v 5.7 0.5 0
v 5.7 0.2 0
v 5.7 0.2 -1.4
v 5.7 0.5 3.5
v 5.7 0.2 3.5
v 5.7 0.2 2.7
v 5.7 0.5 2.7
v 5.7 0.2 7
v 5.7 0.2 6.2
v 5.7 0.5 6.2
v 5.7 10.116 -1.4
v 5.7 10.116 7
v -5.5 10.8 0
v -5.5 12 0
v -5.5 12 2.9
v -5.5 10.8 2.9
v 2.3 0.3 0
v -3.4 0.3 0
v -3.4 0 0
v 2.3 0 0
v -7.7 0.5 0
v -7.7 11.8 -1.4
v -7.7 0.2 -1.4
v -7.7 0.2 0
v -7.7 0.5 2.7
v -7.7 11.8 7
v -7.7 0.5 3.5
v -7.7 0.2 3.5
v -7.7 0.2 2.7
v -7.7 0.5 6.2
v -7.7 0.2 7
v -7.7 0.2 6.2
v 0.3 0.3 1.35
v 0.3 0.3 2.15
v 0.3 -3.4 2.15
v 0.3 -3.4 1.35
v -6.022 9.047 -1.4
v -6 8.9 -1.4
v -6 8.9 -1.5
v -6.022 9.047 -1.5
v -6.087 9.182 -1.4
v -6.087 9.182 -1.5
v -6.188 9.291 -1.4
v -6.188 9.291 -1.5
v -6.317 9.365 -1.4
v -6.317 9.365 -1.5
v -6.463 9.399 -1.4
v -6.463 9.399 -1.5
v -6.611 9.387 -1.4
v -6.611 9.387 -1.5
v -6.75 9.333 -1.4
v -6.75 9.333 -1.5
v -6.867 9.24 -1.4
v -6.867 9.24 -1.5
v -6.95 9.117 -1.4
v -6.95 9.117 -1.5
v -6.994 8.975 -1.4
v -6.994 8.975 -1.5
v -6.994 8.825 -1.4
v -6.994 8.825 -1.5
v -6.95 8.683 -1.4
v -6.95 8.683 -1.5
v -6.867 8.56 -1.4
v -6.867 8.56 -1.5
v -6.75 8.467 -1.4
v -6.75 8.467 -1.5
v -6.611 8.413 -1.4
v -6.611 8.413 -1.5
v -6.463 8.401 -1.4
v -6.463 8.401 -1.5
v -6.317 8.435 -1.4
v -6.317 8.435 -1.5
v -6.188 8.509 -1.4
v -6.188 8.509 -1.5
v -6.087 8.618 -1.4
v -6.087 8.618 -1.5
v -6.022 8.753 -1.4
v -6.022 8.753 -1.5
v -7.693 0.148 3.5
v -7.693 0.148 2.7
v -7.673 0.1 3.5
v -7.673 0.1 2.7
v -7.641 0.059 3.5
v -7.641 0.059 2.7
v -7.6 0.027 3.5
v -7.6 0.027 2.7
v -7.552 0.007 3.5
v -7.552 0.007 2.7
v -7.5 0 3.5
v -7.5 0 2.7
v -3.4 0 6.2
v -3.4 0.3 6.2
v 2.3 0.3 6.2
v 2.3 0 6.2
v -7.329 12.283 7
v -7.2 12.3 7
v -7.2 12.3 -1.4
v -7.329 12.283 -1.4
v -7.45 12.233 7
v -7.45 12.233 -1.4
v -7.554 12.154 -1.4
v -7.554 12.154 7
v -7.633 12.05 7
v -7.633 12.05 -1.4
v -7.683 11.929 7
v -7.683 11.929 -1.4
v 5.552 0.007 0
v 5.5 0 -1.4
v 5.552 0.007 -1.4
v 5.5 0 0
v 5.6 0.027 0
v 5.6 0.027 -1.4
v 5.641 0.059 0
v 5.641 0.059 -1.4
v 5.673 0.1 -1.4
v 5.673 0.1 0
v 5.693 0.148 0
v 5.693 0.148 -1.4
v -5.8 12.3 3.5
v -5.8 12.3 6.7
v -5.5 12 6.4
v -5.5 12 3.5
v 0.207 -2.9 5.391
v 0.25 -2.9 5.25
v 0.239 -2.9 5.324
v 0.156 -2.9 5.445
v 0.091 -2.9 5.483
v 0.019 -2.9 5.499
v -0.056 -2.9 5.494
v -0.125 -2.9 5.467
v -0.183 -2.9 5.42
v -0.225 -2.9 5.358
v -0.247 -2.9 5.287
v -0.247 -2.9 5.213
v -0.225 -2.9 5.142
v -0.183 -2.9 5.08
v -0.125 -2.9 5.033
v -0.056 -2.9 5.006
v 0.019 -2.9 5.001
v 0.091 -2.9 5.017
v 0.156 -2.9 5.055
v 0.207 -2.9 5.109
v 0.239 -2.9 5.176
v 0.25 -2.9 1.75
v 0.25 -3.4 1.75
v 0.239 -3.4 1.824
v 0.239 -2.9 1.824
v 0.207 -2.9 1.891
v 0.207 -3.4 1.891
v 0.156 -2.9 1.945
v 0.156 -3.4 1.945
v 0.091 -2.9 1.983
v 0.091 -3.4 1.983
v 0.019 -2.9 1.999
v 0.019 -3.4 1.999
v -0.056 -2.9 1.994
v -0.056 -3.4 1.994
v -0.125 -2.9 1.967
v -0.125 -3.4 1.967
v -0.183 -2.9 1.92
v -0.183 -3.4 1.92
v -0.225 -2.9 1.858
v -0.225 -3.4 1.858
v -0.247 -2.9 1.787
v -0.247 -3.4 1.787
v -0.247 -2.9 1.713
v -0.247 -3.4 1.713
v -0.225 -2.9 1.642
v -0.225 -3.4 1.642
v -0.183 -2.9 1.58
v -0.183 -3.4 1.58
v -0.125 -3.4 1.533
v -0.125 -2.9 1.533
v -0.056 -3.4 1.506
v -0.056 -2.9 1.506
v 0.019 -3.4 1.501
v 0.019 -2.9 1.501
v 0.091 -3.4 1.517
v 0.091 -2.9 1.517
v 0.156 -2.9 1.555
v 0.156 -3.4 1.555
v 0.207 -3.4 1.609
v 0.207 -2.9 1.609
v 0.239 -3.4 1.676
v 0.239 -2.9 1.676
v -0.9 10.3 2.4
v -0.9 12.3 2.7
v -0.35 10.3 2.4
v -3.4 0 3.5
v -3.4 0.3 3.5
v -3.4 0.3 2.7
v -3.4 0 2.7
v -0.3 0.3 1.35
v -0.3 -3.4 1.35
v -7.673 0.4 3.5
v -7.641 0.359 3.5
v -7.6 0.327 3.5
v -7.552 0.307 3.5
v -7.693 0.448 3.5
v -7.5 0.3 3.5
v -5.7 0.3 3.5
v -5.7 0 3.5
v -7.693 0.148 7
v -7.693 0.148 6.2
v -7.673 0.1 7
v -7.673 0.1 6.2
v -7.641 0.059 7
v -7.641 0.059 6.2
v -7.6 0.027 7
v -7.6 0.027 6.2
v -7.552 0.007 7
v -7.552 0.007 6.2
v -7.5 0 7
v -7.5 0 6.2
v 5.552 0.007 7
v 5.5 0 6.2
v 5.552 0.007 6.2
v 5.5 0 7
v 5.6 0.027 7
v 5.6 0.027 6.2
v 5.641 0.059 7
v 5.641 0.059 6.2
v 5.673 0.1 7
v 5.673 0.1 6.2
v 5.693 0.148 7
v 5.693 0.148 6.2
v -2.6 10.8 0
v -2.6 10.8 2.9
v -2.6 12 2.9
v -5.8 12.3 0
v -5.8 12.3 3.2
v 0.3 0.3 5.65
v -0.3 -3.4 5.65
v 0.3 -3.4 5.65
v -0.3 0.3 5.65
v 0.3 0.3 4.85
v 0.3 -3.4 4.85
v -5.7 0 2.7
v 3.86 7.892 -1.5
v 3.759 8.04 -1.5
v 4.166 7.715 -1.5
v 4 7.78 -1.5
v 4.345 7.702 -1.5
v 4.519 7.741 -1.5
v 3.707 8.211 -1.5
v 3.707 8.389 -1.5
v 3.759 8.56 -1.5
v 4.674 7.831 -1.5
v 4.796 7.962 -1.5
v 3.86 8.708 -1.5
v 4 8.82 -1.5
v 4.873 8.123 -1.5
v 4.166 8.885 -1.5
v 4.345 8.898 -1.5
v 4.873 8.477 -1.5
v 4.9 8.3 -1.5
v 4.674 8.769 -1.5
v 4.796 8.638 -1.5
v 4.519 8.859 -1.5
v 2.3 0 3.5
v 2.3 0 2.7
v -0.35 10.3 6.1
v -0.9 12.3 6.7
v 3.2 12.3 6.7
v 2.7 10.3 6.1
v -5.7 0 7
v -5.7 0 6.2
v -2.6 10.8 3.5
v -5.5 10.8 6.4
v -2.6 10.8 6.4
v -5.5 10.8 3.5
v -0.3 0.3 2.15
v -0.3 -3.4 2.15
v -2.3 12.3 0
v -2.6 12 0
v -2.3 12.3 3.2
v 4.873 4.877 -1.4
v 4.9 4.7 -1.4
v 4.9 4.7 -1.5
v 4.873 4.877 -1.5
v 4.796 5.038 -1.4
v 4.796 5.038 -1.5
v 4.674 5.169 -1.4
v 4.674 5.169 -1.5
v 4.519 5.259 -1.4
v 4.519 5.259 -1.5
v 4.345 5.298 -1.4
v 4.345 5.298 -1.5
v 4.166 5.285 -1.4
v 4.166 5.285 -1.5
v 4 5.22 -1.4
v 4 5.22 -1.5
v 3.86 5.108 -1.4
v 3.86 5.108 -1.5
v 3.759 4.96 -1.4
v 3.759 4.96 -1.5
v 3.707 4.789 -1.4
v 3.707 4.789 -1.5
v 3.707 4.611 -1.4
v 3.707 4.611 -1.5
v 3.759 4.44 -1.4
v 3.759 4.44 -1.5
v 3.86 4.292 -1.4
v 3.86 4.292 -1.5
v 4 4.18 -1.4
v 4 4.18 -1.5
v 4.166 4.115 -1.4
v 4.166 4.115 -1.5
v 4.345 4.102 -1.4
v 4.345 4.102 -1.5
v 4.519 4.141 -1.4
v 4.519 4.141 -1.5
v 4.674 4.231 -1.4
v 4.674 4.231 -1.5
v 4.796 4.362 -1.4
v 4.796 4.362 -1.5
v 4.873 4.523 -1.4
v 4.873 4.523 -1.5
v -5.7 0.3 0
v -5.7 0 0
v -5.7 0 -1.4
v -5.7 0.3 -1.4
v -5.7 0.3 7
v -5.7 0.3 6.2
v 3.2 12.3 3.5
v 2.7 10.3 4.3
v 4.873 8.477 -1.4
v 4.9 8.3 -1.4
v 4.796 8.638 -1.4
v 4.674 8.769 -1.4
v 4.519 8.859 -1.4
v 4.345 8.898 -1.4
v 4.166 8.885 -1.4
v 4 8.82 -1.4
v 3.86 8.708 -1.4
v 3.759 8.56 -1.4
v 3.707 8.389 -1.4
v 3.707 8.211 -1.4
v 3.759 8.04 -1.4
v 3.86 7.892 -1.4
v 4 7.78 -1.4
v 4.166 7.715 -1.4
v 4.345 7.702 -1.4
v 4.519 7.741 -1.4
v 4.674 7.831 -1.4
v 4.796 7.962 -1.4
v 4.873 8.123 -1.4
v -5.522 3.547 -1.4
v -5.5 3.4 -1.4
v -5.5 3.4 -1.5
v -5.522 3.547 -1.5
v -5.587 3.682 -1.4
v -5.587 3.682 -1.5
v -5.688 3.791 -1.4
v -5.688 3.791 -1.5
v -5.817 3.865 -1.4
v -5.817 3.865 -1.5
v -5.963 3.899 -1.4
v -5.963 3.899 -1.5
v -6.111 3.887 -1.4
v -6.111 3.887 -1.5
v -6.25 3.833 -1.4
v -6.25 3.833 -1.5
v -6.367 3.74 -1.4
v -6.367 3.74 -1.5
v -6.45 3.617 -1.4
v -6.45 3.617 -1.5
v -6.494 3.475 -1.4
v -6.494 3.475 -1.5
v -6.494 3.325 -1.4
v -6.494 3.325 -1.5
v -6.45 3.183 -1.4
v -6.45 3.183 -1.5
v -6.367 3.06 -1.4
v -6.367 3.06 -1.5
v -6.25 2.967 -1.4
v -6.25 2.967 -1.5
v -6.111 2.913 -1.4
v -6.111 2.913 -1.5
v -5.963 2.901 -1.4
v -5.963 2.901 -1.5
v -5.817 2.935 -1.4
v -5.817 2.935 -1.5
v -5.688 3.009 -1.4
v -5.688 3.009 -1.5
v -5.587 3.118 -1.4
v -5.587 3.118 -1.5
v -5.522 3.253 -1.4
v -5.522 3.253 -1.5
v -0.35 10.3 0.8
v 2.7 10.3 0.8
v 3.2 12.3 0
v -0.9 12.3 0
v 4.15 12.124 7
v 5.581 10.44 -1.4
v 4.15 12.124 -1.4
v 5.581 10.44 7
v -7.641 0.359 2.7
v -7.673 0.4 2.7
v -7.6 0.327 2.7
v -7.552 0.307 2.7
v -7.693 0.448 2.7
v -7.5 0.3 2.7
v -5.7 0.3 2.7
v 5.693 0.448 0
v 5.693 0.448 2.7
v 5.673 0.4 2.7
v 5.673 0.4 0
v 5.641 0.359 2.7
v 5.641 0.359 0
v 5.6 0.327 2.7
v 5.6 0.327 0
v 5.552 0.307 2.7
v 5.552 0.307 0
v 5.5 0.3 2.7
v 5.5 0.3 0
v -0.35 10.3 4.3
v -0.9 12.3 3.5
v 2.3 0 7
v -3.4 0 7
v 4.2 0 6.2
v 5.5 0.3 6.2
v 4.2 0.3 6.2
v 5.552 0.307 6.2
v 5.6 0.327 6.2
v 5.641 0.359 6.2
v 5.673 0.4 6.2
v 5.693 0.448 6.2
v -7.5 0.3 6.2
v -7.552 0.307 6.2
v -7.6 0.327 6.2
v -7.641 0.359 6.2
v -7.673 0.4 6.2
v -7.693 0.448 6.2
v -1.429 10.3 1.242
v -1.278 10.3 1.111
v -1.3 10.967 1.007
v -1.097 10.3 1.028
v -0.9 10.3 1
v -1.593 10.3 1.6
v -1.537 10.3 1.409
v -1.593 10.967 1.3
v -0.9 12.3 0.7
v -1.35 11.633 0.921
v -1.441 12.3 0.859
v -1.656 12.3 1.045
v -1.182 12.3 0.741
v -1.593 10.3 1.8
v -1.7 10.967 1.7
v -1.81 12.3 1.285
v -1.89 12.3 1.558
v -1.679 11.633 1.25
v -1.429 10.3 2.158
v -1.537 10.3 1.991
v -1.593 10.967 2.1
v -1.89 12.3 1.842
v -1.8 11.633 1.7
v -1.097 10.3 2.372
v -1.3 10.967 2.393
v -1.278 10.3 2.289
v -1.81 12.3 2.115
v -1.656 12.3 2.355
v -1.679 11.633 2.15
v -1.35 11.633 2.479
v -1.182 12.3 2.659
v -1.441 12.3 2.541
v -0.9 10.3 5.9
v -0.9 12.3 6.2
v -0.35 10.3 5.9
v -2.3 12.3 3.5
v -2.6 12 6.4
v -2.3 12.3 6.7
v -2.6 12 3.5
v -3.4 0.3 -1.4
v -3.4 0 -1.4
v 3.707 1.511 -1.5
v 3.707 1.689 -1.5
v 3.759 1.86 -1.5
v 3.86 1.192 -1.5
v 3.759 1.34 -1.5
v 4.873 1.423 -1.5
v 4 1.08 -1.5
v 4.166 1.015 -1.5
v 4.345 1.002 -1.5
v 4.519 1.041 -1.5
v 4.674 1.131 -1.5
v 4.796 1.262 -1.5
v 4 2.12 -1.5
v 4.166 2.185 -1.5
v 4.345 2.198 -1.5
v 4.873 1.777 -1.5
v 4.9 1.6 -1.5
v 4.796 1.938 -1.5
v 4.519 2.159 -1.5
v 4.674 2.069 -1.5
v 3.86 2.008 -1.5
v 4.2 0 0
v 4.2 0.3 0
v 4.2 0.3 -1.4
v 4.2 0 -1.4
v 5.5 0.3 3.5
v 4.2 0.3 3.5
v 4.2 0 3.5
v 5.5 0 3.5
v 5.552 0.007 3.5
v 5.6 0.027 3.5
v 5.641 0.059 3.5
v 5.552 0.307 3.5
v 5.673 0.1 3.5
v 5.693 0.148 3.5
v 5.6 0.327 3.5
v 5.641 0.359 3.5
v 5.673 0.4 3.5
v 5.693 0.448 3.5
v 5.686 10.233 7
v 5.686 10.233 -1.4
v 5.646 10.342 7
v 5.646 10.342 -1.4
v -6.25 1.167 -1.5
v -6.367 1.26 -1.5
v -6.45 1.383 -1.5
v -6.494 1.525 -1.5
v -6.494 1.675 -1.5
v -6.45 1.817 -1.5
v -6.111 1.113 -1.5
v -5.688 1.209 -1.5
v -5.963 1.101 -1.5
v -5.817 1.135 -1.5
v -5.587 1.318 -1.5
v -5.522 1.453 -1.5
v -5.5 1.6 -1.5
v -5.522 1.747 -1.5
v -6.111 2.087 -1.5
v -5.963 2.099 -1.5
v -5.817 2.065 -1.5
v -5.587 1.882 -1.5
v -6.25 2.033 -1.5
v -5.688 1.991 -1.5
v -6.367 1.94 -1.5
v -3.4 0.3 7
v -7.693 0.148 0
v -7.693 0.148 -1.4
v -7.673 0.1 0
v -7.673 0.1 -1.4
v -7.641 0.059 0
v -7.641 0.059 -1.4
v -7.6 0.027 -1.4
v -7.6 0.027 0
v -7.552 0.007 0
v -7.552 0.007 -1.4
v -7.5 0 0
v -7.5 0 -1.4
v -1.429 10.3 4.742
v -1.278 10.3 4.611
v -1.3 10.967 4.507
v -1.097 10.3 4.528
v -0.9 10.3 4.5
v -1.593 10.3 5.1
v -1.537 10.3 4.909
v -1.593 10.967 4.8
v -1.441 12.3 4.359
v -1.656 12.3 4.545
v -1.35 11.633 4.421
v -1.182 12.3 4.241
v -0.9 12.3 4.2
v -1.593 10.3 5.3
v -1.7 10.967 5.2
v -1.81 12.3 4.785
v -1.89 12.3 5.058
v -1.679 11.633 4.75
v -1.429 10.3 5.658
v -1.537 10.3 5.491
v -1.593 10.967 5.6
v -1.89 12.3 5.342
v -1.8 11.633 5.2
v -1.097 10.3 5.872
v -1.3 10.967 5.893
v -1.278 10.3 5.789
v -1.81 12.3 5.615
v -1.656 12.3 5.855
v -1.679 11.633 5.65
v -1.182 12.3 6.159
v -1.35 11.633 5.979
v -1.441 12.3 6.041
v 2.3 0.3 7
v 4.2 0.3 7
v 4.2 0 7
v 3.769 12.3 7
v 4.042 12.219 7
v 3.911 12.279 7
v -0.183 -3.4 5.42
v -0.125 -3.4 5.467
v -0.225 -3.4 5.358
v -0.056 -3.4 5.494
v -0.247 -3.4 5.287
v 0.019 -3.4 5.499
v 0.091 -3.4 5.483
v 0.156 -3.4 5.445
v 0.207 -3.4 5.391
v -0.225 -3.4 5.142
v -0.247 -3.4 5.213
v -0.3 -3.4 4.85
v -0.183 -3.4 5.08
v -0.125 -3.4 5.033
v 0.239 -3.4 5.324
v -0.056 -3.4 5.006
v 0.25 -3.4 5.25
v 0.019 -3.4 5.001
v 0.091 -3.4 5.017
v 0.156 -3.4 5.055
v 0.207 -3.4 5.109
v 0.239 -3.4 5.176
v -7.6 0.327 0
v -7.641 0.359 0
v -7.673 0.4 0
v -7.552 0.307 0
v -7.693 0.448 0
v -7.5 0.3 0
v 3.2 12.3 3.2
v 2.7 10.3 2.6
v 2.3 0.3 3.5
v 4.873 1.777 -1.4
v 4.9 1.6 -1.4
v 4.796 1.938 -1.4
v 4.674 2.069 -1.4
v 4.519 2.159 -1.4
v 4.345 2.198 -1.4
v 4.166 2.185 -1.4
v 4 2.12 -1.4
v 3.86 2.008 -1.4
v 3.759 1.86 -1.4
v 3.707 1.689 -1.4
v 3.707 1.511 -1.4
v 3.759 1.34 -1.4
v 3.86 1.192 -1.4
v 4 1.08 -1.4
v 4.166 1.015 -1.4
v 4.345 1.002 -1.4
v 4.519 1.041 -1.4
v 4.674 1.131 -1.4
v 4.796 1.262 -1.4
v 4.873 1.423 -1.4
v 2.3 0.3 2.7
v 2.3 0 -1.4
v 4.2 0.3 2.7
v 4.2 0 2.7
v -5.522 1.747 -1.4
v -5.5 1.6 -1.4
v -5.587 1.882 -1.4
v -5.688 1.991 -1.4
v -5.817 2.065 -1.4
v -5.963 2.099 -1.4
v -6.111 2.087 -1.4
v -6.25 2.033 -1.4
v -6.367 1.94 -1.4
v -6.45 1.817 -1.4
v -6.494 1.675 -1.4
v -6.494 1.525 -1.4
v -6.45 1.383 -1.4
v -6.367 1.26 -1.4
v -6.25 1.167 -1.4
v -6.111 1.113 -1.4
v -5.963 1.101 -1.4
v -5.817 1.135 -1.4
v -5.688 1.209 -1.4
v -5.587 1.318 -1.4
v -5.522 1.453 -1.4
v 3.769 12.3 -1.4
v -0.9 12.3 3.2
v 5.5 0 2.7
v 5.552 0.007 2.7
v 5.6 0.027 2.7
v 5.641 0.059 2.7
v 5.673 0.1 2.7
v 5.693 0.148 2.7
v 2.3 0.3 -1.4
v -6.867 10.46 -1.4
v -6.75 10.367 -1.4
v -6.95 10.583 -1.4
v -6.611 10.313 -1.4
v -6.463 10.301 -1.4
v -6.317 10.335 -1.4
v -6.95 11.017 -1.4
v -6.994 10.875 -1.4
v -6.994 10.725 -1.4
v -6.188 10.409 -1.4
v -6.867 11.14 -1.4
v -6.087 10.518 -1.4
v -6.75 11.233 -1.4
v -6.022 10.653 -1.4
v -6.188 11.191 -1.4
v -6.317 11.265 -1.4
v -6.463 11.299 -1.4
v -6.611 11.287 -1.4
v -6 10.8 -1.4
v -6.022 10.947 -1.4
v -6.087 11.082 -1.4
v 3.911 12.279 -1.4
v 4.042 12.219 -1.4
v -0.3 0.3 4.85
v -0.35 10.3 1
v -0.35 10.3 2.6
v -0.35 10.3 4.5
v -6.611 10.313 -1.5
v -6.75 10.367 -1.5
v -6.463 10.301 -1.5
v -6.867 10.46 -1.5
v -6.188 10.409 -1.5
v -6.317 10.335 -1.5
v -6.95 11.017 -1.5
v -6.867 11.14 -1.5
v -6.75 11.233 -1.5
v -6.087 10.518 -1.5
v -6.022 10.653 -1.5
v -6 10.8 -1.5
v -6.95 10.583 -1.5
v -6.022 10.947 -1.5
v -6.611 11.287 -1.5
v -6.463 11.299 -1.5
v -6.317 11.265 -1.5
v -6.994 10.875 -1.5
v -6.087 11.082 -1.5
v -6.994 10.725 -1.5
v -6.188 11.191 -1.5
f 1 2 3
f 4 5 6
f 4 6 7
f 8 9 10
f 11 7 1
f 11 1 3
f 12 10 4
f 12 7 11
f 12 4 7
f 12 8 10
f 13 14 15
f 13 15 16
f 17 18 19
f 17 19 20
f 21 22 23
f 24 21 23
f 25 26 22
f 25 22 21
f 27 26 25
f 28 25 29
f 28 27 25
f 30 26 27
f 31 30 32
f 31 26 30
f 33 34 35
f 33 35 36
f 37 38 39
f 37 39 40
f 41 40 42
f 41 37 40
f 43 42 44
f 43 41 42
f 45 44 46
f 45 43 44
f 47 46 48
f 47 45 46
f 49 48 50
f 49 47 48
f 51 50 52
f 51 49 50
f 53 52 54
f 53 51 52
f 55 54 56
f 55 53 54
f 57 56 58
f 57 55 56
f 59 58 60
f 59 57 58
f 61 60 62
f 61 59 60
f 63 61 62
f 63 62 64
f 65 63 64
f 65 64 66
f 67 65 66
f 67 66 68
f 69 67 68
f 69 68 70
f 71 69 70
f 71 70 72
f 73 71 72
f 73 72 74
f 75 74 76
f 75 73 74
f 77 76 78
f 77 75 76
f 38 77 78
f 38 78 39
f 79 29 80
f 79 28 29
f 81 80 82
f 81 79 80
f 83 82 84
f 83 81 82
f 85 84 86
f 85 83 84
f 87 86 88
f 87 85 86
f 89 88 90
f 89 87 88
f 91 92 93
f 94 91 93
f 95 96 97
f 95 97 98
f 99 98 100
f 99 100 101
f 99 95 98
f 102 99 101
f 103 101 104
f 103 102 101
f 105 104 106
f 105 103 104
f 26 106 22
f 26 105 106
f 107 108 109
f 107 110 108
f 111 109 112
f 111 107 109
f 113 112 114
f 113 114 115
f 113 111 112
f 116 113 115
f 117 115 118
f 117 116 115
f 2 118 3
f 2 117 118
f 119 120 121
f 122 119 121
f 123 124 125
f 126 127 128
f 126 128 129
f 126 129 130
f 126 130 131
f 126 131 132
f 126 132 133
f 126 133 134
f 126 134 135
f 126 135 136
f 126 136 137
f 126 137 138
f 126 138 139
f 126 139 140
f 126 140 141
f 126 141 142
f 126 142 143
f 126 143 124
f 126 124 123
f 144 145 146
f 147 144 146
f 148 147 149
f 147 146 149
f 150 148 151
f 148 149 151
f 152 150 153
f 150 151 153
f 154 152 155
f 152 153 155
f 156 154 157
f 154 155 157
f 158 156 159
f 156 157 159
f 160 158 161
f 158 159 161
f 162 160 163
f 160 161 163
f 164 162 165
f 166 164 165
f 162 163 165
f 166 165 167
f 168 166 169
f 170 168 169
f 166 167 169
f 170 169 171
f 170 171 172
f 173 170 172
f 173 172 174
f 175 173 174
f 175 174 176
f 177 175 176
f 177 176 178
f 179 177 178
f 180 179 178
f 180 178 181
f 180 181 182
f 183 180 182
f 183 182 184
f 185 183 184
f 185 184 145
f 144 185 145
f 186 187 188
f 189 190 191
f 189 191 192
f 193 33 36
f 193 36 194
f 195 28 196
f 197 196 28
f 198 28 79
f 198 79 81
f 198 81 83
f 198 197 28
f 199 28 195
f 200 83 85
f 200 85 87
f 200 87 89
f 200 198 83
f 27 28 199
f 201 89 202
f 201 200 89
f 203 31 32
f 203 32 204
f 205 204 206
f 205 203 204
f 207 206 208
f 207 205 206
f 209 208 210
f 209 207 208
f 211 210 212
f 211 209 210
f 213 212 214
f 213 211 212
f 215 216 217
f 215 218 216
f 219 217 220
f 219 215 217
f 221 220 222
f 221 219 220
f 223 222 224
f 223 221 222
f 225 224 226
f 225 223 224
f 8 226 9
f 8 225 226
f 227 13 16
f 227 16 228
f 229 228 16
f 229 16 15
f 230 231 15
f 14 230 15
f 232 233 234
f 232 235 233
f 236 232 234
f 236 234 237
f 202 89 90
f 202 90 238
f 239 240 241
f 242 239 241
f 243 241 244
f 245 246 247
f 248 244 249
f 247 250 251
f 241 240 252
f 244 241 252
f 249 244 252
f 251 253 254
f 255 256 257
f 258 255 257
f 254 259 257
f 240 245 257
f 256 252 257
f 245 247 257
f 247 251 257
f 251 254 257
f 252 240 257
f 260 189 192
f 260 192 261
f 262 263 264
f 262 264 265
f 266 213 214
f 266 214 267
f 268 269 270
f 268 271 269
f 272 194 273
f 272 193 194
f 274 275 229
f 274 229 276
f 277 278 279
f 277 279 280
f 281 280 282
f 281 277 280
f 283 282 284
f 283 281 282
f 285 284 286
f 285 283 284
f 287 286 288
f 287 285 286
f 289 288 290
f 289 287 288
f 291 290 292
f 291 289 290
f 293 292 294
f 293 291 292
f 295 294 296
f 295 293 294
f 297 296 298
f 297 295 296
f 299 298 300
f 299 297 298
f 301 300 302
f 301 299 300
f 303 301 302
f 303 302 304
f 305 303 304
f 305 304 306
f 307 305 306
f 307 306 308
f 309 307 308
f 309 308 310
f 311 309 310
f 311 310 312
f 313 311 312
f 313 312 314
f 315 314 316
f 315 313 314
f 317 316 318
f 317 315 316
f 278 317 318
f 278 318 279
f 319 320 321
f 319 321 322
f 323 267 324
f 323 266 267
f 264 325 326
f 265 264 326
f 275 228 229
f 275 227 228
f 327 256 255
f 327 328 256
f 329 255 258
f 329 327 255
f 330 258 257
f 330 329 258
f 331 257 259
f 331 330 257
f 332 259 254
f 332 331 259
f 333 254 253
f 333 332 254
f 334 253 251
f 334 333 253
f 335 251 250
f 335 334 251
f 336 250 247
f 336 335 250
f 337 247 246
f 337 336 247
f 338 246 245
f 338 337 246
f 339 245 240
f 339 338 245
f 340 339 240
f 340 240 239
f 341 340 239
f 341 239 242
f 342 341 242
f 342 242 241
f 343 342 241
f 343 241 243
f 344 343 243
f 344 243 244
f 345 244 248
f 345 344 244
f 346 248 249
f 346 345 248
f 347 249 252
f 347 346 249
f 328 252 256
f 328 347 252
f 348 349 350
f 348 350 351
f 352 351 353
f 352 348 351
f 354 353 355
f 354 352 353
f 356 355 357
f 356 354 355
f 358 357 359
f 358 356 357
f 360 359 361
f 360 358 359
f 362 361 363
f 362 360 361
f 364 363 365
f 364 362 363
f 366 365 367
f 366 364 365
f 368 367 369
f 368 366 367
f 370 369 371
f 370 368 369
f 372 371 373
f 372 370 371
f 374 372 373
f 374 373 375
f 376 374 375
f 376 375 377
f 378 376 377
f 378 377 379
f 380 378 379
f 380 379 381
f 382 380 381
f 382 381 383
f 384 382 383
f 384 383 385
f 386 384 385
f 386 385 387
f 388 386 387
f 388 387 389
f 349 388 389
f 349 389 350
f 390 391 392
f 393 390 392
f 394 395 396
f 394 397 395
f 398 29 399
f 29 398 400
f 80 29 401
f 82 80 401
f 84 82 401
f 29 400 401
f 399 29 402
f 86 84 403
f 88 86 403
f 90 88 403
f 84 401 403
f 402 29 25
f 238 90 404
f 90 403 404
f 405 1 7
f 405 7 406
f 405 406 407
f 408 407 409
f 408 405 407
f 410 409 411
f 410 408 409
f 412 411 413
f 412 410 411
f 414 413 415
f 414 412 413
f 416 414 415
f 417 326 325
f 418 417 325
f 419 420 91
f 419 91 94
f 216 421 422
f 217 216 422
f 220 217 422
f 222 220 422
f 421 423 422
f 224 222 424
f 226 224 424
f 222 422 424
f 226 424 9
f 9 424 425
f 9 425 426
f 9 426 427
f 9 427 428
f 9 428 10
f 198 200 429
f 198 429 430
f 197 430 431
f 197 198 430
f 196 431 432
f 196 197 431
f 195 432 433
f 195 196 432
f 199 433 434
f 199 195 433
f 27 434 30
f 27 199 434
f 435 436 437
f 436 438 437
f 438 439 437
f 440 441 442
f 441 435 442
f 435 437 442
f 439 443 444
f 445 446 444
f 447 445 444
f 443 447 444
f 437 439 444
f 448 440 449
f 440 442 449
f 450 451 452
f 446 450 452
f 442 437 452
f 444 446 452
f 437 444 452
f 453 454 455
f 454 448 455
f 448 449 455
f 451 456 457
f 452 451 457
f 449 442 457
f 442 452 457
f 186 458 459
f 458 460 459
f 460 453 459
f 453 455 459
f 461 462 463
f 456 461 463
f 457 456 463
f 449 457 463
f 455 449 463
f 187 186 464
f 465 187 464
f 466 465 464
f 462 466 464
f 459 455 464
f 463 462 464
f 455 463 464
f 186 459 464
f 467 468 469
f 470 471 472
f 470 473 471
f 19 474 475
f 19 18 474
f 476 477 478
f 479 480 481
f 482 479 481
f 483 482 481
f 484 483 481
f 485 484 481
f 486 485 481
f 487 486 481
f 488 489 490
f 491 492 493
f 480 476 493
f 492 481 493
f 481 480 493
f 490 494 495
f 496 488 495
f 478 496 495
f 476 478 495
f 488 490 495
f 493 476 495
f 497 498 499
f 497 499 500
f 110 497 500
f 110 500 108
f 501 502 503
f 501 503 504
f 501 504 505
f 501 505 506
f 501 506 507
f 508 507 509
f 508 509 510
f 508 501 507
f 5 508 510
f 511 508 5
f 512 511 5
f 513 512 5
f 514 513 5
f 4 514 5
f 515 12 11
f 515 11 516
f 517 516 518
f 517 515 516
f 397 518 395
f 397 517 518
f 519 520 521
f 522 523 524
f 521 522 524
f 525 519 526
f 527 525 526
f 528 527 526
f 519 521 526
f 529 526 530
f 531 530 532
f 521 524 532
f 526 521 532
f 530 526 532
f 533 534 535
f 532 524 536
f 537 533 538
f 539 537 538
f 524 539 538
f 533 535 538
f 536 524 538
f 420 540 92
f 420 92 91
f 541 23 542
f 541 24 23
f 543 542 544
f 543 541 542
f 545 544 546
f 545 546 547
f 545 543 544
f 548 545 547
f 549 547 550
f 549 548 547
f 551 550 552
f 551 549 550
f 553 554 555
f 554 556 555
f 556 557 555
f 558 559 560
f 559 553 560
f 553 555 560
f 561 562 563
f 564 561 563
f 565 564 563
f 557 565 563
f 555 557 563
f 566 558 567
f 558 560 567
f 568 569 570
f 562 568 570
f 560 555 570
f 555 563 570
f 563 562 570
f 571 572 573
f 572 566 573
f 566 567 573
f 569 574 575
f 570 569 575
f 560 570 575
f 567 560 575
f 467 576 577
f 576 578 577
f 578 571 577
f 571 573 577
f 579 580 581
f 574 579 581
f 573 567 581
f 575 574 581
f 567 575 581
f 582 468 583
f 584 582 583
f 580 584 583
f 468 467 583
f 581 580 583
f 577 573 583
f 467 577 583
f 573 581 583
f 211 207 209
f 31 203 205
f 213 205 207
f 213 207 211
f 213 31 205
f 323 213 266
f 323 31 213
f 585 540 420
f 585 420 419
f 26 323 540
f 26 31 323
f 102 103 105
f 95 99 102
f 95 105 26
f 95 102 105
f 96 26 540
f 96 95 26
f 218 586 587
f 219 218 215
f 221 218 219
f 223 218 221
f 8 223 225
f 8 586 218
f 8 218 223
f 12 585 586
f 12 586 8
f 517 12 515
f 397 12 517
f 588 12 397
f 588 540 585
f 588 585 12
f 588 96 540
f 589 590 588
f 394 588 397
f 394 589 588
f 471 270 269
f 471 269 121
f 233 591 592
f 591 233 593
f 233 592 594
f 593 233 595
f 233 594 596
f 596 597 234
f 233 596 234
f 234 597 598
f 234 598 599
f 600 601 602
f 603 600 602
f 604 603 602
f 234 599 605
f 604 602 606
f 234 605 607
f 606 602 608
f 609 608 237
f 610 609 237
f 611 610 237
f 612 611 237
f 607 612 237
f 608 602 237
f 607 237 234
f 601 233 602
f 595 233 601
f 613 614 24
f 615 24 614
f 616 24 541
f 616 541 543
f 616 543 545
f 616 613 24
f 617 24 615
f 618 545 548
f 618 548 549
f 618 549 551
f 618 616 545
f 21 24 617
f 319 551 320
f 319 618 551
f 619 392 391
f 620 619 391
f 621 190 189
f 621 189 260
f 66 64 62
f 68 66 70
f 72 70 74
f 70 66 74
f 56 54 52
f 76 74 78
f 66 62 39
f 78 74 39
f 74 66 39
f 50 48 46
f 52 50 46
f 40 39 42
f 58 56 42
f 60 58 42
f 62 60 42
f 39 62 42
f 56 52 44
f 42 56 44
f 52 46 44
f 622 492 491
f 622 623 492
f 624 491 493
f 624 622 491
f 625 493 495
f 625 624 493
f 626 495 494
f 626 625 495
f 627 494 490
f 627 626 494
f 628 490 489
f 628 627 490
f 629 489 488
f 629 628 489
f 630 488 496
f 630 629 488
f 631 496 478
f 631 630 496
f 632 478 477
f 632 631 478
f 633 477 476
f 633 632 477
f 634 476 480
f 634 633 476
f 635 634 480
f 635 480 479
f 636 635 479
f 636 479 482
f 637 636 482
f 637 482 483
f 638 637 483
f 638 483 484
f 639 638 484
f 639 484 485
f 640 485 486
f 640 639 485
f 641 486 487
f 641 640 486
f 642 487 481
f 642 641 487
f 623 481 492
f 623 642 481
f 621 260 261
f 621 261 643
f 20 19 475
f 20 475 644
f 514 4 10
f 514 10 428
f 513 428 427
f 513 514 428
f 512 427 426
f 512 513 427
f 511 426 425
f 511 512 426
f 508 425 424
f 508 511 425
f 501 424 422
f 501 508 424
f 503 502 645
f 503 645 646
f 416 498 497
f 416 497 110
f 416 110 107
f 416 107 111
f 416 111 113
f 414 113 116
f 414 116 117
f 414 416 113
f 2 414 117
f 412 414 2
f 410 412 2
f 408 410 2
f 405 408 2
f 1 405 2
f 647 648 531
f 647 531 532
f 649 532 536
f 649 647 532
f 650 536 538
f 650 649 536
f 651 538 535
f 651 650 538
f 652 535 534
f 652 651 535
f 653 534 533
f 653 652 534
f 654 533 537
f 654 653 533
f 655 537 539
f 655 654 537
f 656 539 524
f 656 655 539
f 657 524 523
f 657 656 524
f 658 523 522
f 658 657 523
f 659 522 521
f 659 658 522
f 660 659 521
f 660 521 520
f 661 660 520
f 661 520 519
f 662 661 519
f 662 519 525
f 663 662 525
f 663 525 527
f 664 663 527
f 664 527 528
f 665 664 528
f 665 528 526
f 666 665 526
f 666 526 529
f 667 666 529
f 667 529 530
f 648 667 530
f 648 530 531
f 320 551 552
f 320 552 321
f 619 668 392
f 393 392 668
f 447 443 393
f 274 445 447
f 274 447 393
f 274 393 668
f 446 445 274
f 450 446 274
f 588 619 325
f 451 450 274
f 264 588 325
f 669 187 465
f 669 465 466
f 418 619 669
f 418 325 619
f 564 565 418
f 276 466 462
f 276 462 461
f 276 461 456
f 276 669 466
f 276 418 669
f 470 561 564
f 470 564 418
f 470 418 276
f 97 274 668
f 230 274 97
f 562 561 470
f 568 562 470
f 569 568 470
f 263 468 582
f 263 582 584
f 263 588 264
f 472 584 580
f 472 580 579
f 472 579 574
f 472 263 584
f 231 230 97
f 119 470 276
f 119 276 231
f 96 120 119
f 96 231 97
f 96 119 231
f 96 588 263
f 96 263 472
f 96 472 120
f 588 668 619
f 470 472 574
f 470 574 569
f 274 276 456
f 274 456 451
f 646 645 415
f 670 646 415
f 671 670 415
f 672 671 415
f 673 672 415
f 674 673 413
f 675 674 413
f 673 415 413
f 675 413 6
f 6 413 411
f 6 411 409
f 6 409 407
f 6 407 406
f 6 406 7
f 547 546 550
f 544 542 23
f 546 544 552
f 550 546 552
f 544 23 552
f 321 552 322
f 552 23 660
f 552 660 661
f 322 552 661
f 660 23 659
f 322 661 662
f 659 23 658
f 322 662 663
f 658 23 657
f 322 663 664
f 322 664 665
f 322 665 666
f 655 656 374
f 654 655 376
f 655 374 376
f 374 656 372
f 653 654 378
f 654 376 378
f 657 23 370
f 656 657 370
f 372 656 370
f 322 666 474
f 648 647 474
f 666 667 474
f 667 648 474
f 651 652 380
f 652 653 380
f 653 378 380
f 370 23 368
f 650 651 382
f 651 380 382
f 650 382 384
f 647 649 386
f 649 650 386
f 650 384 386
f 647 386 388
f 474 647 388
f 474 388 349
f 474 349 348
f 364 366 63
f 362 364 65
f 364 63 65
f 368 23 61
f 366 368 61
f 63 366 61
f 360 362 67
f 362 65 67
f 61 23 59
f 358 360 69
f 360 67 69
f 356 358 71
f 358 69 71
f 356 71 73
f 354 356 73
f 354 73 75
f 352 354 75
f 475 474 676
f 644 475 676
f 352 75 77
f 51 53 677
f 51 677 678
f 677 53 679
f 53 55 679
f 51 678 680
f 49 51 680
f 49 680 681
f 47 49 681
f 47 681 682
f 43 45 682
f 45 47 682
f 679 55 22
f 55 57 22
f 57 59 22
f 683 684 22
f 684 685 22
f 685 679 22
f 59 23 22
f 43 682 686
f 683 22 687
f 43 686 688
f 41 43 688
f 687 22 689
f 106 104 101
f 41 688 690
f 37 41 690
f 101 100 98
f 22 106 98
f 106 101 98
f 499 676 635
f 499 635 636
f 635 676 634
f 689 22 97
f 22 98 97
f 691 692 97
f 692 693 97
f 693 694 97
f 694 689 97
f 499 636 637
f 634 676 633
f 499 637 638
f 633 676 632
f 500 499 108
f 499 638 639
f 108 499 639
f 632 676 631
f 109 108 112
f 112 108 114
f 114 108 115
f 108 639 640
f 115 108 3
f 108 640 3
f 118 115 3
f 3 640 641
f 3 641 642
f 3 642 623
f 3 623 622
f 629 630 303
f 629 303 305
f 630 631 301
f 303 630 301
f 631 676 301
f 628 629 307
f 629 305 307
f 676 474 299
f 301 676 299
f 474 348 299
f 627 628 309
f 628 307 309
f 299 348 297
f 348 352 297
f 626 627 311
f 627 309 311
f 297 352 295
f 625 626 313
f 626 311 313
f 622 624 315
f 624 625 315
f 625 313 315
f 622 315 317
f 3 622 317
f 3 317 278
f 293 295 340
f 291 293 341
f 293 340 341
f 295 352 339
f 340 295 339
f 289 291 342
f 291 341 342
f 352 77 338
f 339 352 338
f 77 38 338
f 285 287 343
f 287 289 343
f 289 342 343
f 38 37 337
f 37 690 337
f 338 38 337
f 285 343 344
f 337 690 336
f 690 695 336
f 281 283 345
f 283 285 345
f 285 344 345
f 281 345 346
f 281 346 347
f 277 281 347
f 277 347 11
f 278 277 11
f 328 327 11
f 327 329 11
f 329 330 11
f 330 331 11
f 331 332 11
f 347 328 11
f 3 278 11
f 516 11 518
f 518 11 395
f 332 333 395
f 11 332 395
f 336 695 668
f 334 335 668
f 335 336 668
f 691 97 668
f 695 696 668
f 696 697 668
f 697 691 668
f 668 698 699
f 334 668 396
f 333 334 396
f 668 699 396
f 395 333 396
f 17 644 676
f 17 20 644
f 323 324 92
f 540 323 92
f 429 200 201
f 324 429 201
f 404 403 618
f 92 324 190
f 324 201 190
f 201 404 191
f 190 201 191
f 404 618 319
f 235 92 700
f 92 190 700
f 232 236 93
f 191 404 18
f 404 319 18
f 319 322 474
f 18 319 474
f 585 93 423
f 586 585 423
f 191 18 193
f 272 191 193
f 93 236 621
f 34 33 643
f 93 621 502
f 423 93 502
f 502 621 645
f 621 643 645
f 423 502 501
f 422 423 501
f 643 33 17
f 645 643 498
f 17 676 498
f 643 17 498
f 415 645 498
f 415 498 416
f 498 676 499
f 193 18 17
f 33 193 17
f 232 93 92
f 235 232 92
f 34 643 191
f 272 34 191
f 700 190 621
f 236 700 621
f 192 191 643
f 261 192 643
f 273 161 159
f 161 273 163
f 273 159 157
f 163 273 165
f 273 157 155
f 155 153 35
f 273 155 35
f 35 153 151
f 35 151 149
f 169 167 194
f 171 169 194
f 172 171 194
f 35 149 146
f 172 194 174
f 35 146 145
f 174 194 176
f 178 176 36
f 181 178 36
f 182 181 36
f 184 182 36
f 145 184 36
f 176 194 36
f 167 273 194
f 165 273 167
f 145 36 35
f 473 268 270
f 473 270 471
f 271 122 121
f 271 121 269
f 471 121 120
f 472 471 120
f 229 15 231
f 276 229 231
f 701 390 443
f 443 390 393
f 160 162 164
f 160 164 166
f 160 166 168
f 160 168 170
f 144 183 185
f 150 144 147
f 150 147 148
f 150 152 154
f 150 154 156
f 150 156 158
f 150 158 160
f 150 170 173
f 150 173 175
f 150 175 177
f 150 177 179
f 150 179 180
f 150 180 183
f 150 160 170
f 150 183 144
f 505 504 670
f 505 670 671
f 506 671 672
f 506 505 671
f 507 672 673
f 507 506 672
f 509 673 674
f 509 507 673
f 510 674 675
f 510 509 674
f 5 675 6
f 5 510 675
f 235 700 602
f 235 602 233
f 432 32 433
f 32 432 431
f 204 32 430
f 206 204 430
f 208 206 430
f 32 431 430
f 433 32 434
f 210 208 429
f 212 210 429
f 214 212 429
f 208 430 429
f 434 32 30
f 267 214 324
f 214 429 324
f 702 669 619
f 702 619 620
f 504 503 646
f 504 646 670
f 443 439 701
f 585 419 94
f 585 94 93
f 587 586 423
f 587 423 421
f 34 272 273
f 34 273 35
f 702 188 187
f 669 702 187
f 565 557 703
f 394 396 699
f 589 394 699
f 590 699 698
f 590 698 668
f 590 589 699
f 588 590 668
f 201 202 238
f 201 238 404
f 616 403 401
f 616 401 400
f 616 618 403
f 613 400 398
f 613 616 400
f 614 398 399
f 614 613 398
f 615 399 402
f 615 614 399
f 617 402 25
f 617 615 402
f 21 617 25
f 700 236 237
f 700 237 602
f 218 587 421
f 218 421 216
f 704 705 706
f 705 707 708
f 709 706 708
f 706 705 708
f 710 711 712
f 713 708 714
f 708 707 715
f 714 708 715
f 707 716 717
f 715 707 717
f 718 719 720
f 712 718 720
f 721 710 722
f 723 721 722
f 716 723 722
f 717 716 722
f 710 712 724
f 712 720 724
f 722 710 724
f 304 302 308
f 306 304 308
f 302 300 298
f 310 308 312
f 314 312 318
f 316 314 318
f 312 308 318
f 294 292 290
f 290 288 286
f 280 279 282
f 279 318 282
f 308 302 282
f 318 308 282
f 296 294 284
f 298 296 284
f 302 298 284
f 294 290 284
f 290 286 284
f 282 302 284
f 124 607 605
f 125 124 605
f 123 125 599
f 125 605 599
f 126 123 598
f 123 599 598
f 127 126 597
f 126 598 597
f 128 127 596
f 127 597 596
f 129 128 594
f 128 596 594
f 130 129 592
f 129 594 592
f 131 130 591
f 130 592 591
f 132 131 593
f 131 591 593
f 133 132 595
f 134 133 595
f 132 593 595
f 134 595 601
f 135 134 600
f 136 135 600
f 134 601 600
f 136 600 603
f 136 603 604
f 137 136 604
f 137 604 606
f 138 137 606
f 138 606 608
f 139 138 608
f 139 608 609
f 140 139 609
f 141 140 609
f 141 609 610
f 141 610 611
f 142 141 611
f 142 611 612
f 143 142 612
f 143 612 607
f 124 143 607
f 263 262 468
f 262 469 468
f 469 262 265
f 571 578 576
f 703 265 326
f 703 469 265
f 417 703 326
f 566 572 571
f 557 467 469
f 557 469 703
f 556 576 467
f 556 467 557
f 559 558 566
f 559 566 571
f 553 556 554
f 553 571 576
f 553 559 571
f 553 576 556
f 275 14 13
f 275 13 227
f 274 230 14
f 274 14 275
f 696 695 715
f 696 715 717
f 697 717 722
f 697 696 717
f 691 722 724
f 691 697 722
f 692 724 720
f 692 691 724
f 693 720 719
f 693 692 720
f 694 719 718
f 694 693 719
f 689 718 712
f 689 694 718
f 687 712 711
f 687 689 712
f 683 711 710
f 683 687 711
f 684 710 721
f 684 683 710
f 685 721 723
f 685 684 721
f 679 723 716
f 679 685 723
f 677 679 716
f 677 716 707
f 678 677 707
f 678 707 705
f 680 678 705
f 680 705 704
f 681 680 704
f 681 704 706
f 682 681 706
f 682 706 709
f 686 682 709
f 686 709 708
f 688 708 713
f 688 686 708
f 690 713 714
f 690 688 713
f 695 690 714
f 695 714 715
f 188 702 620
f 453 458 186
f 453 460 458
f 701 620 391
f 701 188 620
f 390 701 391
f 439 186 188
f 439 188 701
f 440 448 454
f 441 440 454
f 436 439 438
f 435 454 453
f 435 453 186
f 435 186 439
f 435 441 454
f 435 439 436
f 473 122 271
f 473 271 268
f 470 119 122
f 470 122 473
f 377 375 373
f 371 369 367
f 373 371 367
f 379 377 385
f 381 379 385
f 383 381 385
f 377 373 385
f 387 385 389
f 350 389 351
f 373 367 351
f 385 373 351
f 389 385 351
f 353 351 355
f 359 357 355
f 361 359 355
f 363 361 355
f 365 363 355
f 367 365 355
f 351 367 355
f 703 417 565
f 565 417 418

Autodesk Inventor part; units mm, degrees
ref_plane "YZ Plane" through (0, 0, 0) normal (1, 0, 0) x (0, 1, 0)
ref_plane "XZ Plane" through (0, 0, 0) normal (0, 1, 0) x (-1, 0, 0)
ref_plane "XY Plane" through (0, 0, 0) normal (0, 0, 1) x (1, 0, 0)
sketch "Skizze_1" plane through (0, 0, 0) normal (0, 0, 1) x (1, 0, 0)
  arc A0 (-7.7, 0.5) -> (-7.5, 0.3) centre (-7.5, 0.5) ccw
  line L0 (-7.5, 0.3) -> (5.5, 0.3)
  arc A1 (5.5, 0.3) -> (5.7, 0.5) centre (5.5, 0.5) ccw
  line L1 (5.7, 0.5) -> (5.7, 10.1162)
  arc A2 (5.7, 10.1162) -> (5.581, 10.44) centre (5.2, 10.1162) ccw
  line L2 (5.581, 10.44) -> (4.1497, 12.1238)
  arc A3 (4.1497, 12.1238) -> (3.7688, 12.3) centre (3.7688, 11.8) ccw
  line L3 (3.7688, 12.3) -> (-7.2, 12.3)
  arc A4 (-7.2, 12.3) -> (-7.7, 11.8) centre (-7.2, 11.8) ccw
  line L4 (-7.7, 11.8) -> (-7.7, 0.5)
extrude "Extrusion1" add sketch "Skizze_1" along normal blind 7
sketch "Skizze_2" plane through (0, 0, 7) normal (0, 0, 1) x (1, 0, 0)
  line L0 (4.2, 0) -> (5.5, 0)
  arc A0 (5.5, 0) -> (5.7, 0.2) centre (5.5, 0.2) ccw
  line L1 (5.7, 0.2) -> (5.7, 0.5)
  line L2 (5.7, 0.5) -> (4.2, 0.5)
  line L3 (4.2, 0.5) -> (4.2, 0)
extrude "Extrusion2" add sketch "Skizze_2" against normal blind 0.8
pattern_linear "Rectangular Pattern1" count 2 spacing 3.5 along (0, 0, -1) of "Extrusion2"
sketch "Skizze_4" plane through (0, 0, 7) normal (0, 0, 1) x (1, 0, 0)
  line L0 (-7.7, 1) -> (-7.7, 0.2)
  arc A0 (-7.7, 0.2) -> (-7.5, 0) centre (-7.5, 0.2) ccw
  line L1 (-7.5, 0) -> (-5.7, 0)
  line L2 (-5.7, 0) -> (-5.7, 1)
  line L3 (-5.7, 1) -> (-7.7, 1)
extrude "Extrusion3" add sketch "Skizze_4" against normal blind 0.8
pattern_linear "Rectangular Pattern2" count 2 spacing 3.5 along (0, 0, -1) of "Extrusion3"
sketch "Skizze_6" plane through (0, 0, 7) normal (0, 0, 1) x (1, 0, 0)
  line L0 (-3.4, 0) -> (2.3, 0)
  line L1 (2.3, 0) -> (2.3, 1)
  line L2 (2.3, 1) -> (-3.4, 1)
  line L3 (-3.4, 1) -> (-3.4, 0)
extrude "Extrusion4" add sketch "Skizze_6" against normal blind 0.8
pattern_linear "Rectangular Pattern3" count 2 spacing 3.5 along (0, 0, -1) of "Extrusion4"
sketch "Skizze_8" plane through (0, 0, 0) normal (0, 0, 1) x (1, 0, 0)
  circle A0 centre (4.3, 1.6) radius 0.6
extrude "Extrusion5" add sketch "Skizze_8" against normal blind 1.5
sketch "Skizze_9" plane through (0, 0, 0) normal (0, 0, 1) x (1, 0, 0)
  circle A0 centre (4.3, 4.7) radius 0.6
extrude "Extrusion6" add sketch "Skizze_9" against normal blind 1.5
sketch "Skizze_10" plane through (0, 0, 0) normal (0, 0, 1) x (1, 0, 0)
  circle A0 centre (4.3, 8.3) radius 0.6
extrude "Extrusion7" add sketch "Skizze_10" against normal blind 1.5
sketch "Skizze_11" plane through (0, 0, 0) normal (0, 0, 1) x (1, 0, 0)
  circle A0 centre (-6, 1.6) radius 0.5
extrude "Extrusion8" add sketch "Skizze_11" against normal blind 1.5
sketch "Skizze_12" plane through (0, 0, 0) normal (0, 0, 1) x (1, 0, 0)
  circle A0 centre (-6, 3.4) radius 0.5
extrude "Extrusion9" add sketch "Skizze_12" against normal blind 1.5
sketch "Skizze_13" plane through (0, 0, 0) normal (0, 0, 1) x (1, 0, 0)
  circle A0 centre (-6.5, 8.9) radius 0.5
extrude "Extrusion10" add sketch "Skizze_13" against normal blind 1.5
sketch "Skizze_14" plane through (0, 0, 0) normal (0, 0, 1) x (1, 0, 0)
  circle A0 centre (-6.5, 10.8) radius 0.5
extrude "Extrusion11" add sketch "Skizze_14" against normal blind 1.5
sketch "Skizze_15" plane through (0, 0, 0) normal (0, 0, 1) x (1, 0, 0)
  arc A0 (-7.7, 0.2) -> (-7.5, 0) centre (-7.5, 0.2) ccw
  line L0 (-7.5, 0) -> (-5.7, 0)
  line L1 (-5.7, 0) -> (-5.7, 0.3)
  line L2 (-5.7, 0.3) -> (-3.4, 0.3)
  line L3 (-3.4, 0.3) -> (-3.4, 0)
  line L4 (-3.4, 0) -> (2.3, 0)
  line L5 (2.3, 0) -> (2.3, 0.3)
  line L6 (2.3, 0.3) -> (4.2, 0.3)
  line L7 (4.2, 0.3) -> (4.2, 0)
  line L8 (4.2, 0) -> (5.5, 0)
  arc A1 (5.5, 0) -> (5.7, 0.2) centre (5.5, 0.2) ccw
  line L9 (5.7, 0.2) -> (5.7, 10.1162)
  arc A2 (5.7, 10.1162) -> (5.581, 10.44) centre (5.2, 10.1162) ccw
  line L10 (5.581, 10.44) -> (4.1497, 12.1238)
  arc A3 (4.1497, 12.1238) -> (3.7688, 12.3) centre (3.7688, 11.8) ccw
  line L11 (3.7688, 12.3) -> (-7.2, 12.3)
  arc A4 (-7.2, 12.3) -> (-7.7, 11.8) centre (-7.2, 11.8) ccw
  line L12 (-7.7, 11.8) -> (-7.7, 0.2)
extrude "Extrusion12" add sketch "Skizze_15" against normal blind 1.4
sketch "Skizze_16" plane through (0, 0, 0) normal (0, 0, 1) x (1, 0, 0)
  line L0 (-5.8, 12.3) -> (-5.5, 12)
  line L1 (-5.5, 12) -> (-5.5, 10.8)
  line L2 (-5.5, 10.8) -> (-2.6, 10.8)
  line L3 (-2.6, 10.8) -> (-2.6, 12)
  line L4 (-2.6, 12) -> (-2.3, 12.3)
  line L5 (-2.3, 12.3) -> (-5.8, 12.3)
extrude "Extrusion13" cut sketch "Skizze_16" along normal blind 3.2
pattern_linear "Rectangular Pattern4" count 2 spacing 3.5 along (0, 0, 1) of "Extrusion13"
sketch "Skizze_18" plane through (0, 0, 0) normal (1, 0, 0) x (0, 1, 0)
  line L0 (10.8, 3.2) -> (10.8, 2.9)
  line L1 (10.8, 2.9) -> (12, 2.9)
  line L2 (12, 2.9) -> (12.3, 3.2)
  line L3 (12.3, 3.2) -> (10.8, 3.2)
extrude "Extrusion14" add sketch "Skizze_18" against normal blind 6
pattern_linear "Rectangular Pattern5" count 2 spacing 3.5 along (0, 0, 1) of "Extrusion14"
sketch "Skizze_20" plane through (-0.9, 0, 0) normal (1, 0, 0) x (0, 0, -1)
  line L0 (-3.2, 12.3) -> (-2.6, 10.3)
  line L1 (-2.6, 10.3) -> (-0.8, 10.3)
  line L2 (-0.8, 10.3) -> (0, 12.3)
  line L3 (0, 12.3) -> (-3.2, 12.3)
extrude "Extrusion15" cut sketch "Skizze_20" along normal blind 4.1
pattern_linear "Rectangular Pattern6" count 2 spacing 3.5 along (0, 0, 1) of "Extrusion15"
sketch "Skizze_22" plane through (0, 0, 0) normal (0, 0, 1) x (1, 0, 0)
  line L0 (-0.9, 9.8) -> (3.2, 9.8)
  line L1 (3.2, 9.8) -> (3.2, 12.3)
  line L2 (3.2, 12.3) -> (2.7, 10.3)
  line L3 (2.7, 10.3) -> (-0.35, 10.3)
  line L4 (-0.35, 10.3) -> (-0.9, 12.3)
  line L5 (-0.9, 12.3) -> (-0.9, 9.8)
extrude "Extrusion16" add sketch "Skizze_22" along normal blind 7
sketch "Skizze_23" plane through (-0.9, 0, 0) normal (1, 0, 0) x (0, 0, -1)
  line L0 (-1.7, 10.3) -> (-1.7, 12.3)
  line L1 (-1.7, 12.3) -> (-0.7, 12.3)
  line L2 (-0.7, 12.3) -> (-1, 10.3)
  line L3 (-1, 10.3) -> (-1.7, 10.3)
  line L4 (-1.7, 10.3) -> (-1.7, 12.3)
revolve "Revolution1" cut sketch "Skizze_23" angle 360 about axis through (-0.9, 10.3, 1.7) along (0, -1, 0)
pattern_linear "Rectangular Pattern7" count 2 spacing 3.5 along (0, 0, 1) of "Revolution1"
sketch "Skizze_24" plane through (-0.9, 0, 0) normal (1, 0, 0) x (0, 0, -1)
  line L0 (-2.7, 12.3) -> (-2.4, 10.3)
  line L1 (-2.4, 10.3) -> (-1, 10.3)
  line L2 (-1, 10.3) -> (-0.7, 12.3)
  line L3 (-0.7, 12.3) -> (-2.7, 12.3)
extrude "Extrusion17" cut sketch "Skizze_24" along normal blind 1
pattern_linear "Rectangular Pattern8" count 2 spacing 3.5 along (0, 0, 1) of "Extrusion17"
sketch "Skizze_27" plane through (0, 0.3, 0) normal (0, 1, 0) x (1, 0, 0)
  line L0 (-0.3, -1.35) -> (-0.3, -2.15)
  line L1 (-0.3, -2.15) -> (0.3, -2.15)
  line L2 (0.3, -2.15) -> (0.3, -1.35)
  line L3 (0.3, -1.35) -> (-0.3, -1.35)
extrude "Extrusion18" add sketch "Skizze_27" against normal blind 3.7
pattern_linear "Rectangular Pattern9" count 2 spacing 3.5 along (0, 0, 1) of "Extrusion18"
sketch "Sketch20" plane through (-0.3, -3.4, 5.65) normal (0, -1, 0) x (1, 0, 0)
  line L0 (0, 0) -> (0.6, 0) construction
  line L1 (0.6, -0.8) -> (0, -0.8) construction
  line L2 (0, -3.5) -> (0.6, -3.5) construction
  line L3 (0.6, -4.3) -> (0, -4.3) construction
  line L4 (0, -3.5) -> (0.6, -4.3) construction
  line L5 (0, 0) -> (0.6, -0.8) construction
  circle A0 centre (0.3, -0.4) radius 0.25
  circle A1 centre (0.3, -3.9) radius 0.25
  point P0 (0.3, -5.65)
  dimension "d91" = 0.5
extrude "Extrusion19" cut sketch "Sketch20" against normal blind 0.5
properties part number "739-302"
